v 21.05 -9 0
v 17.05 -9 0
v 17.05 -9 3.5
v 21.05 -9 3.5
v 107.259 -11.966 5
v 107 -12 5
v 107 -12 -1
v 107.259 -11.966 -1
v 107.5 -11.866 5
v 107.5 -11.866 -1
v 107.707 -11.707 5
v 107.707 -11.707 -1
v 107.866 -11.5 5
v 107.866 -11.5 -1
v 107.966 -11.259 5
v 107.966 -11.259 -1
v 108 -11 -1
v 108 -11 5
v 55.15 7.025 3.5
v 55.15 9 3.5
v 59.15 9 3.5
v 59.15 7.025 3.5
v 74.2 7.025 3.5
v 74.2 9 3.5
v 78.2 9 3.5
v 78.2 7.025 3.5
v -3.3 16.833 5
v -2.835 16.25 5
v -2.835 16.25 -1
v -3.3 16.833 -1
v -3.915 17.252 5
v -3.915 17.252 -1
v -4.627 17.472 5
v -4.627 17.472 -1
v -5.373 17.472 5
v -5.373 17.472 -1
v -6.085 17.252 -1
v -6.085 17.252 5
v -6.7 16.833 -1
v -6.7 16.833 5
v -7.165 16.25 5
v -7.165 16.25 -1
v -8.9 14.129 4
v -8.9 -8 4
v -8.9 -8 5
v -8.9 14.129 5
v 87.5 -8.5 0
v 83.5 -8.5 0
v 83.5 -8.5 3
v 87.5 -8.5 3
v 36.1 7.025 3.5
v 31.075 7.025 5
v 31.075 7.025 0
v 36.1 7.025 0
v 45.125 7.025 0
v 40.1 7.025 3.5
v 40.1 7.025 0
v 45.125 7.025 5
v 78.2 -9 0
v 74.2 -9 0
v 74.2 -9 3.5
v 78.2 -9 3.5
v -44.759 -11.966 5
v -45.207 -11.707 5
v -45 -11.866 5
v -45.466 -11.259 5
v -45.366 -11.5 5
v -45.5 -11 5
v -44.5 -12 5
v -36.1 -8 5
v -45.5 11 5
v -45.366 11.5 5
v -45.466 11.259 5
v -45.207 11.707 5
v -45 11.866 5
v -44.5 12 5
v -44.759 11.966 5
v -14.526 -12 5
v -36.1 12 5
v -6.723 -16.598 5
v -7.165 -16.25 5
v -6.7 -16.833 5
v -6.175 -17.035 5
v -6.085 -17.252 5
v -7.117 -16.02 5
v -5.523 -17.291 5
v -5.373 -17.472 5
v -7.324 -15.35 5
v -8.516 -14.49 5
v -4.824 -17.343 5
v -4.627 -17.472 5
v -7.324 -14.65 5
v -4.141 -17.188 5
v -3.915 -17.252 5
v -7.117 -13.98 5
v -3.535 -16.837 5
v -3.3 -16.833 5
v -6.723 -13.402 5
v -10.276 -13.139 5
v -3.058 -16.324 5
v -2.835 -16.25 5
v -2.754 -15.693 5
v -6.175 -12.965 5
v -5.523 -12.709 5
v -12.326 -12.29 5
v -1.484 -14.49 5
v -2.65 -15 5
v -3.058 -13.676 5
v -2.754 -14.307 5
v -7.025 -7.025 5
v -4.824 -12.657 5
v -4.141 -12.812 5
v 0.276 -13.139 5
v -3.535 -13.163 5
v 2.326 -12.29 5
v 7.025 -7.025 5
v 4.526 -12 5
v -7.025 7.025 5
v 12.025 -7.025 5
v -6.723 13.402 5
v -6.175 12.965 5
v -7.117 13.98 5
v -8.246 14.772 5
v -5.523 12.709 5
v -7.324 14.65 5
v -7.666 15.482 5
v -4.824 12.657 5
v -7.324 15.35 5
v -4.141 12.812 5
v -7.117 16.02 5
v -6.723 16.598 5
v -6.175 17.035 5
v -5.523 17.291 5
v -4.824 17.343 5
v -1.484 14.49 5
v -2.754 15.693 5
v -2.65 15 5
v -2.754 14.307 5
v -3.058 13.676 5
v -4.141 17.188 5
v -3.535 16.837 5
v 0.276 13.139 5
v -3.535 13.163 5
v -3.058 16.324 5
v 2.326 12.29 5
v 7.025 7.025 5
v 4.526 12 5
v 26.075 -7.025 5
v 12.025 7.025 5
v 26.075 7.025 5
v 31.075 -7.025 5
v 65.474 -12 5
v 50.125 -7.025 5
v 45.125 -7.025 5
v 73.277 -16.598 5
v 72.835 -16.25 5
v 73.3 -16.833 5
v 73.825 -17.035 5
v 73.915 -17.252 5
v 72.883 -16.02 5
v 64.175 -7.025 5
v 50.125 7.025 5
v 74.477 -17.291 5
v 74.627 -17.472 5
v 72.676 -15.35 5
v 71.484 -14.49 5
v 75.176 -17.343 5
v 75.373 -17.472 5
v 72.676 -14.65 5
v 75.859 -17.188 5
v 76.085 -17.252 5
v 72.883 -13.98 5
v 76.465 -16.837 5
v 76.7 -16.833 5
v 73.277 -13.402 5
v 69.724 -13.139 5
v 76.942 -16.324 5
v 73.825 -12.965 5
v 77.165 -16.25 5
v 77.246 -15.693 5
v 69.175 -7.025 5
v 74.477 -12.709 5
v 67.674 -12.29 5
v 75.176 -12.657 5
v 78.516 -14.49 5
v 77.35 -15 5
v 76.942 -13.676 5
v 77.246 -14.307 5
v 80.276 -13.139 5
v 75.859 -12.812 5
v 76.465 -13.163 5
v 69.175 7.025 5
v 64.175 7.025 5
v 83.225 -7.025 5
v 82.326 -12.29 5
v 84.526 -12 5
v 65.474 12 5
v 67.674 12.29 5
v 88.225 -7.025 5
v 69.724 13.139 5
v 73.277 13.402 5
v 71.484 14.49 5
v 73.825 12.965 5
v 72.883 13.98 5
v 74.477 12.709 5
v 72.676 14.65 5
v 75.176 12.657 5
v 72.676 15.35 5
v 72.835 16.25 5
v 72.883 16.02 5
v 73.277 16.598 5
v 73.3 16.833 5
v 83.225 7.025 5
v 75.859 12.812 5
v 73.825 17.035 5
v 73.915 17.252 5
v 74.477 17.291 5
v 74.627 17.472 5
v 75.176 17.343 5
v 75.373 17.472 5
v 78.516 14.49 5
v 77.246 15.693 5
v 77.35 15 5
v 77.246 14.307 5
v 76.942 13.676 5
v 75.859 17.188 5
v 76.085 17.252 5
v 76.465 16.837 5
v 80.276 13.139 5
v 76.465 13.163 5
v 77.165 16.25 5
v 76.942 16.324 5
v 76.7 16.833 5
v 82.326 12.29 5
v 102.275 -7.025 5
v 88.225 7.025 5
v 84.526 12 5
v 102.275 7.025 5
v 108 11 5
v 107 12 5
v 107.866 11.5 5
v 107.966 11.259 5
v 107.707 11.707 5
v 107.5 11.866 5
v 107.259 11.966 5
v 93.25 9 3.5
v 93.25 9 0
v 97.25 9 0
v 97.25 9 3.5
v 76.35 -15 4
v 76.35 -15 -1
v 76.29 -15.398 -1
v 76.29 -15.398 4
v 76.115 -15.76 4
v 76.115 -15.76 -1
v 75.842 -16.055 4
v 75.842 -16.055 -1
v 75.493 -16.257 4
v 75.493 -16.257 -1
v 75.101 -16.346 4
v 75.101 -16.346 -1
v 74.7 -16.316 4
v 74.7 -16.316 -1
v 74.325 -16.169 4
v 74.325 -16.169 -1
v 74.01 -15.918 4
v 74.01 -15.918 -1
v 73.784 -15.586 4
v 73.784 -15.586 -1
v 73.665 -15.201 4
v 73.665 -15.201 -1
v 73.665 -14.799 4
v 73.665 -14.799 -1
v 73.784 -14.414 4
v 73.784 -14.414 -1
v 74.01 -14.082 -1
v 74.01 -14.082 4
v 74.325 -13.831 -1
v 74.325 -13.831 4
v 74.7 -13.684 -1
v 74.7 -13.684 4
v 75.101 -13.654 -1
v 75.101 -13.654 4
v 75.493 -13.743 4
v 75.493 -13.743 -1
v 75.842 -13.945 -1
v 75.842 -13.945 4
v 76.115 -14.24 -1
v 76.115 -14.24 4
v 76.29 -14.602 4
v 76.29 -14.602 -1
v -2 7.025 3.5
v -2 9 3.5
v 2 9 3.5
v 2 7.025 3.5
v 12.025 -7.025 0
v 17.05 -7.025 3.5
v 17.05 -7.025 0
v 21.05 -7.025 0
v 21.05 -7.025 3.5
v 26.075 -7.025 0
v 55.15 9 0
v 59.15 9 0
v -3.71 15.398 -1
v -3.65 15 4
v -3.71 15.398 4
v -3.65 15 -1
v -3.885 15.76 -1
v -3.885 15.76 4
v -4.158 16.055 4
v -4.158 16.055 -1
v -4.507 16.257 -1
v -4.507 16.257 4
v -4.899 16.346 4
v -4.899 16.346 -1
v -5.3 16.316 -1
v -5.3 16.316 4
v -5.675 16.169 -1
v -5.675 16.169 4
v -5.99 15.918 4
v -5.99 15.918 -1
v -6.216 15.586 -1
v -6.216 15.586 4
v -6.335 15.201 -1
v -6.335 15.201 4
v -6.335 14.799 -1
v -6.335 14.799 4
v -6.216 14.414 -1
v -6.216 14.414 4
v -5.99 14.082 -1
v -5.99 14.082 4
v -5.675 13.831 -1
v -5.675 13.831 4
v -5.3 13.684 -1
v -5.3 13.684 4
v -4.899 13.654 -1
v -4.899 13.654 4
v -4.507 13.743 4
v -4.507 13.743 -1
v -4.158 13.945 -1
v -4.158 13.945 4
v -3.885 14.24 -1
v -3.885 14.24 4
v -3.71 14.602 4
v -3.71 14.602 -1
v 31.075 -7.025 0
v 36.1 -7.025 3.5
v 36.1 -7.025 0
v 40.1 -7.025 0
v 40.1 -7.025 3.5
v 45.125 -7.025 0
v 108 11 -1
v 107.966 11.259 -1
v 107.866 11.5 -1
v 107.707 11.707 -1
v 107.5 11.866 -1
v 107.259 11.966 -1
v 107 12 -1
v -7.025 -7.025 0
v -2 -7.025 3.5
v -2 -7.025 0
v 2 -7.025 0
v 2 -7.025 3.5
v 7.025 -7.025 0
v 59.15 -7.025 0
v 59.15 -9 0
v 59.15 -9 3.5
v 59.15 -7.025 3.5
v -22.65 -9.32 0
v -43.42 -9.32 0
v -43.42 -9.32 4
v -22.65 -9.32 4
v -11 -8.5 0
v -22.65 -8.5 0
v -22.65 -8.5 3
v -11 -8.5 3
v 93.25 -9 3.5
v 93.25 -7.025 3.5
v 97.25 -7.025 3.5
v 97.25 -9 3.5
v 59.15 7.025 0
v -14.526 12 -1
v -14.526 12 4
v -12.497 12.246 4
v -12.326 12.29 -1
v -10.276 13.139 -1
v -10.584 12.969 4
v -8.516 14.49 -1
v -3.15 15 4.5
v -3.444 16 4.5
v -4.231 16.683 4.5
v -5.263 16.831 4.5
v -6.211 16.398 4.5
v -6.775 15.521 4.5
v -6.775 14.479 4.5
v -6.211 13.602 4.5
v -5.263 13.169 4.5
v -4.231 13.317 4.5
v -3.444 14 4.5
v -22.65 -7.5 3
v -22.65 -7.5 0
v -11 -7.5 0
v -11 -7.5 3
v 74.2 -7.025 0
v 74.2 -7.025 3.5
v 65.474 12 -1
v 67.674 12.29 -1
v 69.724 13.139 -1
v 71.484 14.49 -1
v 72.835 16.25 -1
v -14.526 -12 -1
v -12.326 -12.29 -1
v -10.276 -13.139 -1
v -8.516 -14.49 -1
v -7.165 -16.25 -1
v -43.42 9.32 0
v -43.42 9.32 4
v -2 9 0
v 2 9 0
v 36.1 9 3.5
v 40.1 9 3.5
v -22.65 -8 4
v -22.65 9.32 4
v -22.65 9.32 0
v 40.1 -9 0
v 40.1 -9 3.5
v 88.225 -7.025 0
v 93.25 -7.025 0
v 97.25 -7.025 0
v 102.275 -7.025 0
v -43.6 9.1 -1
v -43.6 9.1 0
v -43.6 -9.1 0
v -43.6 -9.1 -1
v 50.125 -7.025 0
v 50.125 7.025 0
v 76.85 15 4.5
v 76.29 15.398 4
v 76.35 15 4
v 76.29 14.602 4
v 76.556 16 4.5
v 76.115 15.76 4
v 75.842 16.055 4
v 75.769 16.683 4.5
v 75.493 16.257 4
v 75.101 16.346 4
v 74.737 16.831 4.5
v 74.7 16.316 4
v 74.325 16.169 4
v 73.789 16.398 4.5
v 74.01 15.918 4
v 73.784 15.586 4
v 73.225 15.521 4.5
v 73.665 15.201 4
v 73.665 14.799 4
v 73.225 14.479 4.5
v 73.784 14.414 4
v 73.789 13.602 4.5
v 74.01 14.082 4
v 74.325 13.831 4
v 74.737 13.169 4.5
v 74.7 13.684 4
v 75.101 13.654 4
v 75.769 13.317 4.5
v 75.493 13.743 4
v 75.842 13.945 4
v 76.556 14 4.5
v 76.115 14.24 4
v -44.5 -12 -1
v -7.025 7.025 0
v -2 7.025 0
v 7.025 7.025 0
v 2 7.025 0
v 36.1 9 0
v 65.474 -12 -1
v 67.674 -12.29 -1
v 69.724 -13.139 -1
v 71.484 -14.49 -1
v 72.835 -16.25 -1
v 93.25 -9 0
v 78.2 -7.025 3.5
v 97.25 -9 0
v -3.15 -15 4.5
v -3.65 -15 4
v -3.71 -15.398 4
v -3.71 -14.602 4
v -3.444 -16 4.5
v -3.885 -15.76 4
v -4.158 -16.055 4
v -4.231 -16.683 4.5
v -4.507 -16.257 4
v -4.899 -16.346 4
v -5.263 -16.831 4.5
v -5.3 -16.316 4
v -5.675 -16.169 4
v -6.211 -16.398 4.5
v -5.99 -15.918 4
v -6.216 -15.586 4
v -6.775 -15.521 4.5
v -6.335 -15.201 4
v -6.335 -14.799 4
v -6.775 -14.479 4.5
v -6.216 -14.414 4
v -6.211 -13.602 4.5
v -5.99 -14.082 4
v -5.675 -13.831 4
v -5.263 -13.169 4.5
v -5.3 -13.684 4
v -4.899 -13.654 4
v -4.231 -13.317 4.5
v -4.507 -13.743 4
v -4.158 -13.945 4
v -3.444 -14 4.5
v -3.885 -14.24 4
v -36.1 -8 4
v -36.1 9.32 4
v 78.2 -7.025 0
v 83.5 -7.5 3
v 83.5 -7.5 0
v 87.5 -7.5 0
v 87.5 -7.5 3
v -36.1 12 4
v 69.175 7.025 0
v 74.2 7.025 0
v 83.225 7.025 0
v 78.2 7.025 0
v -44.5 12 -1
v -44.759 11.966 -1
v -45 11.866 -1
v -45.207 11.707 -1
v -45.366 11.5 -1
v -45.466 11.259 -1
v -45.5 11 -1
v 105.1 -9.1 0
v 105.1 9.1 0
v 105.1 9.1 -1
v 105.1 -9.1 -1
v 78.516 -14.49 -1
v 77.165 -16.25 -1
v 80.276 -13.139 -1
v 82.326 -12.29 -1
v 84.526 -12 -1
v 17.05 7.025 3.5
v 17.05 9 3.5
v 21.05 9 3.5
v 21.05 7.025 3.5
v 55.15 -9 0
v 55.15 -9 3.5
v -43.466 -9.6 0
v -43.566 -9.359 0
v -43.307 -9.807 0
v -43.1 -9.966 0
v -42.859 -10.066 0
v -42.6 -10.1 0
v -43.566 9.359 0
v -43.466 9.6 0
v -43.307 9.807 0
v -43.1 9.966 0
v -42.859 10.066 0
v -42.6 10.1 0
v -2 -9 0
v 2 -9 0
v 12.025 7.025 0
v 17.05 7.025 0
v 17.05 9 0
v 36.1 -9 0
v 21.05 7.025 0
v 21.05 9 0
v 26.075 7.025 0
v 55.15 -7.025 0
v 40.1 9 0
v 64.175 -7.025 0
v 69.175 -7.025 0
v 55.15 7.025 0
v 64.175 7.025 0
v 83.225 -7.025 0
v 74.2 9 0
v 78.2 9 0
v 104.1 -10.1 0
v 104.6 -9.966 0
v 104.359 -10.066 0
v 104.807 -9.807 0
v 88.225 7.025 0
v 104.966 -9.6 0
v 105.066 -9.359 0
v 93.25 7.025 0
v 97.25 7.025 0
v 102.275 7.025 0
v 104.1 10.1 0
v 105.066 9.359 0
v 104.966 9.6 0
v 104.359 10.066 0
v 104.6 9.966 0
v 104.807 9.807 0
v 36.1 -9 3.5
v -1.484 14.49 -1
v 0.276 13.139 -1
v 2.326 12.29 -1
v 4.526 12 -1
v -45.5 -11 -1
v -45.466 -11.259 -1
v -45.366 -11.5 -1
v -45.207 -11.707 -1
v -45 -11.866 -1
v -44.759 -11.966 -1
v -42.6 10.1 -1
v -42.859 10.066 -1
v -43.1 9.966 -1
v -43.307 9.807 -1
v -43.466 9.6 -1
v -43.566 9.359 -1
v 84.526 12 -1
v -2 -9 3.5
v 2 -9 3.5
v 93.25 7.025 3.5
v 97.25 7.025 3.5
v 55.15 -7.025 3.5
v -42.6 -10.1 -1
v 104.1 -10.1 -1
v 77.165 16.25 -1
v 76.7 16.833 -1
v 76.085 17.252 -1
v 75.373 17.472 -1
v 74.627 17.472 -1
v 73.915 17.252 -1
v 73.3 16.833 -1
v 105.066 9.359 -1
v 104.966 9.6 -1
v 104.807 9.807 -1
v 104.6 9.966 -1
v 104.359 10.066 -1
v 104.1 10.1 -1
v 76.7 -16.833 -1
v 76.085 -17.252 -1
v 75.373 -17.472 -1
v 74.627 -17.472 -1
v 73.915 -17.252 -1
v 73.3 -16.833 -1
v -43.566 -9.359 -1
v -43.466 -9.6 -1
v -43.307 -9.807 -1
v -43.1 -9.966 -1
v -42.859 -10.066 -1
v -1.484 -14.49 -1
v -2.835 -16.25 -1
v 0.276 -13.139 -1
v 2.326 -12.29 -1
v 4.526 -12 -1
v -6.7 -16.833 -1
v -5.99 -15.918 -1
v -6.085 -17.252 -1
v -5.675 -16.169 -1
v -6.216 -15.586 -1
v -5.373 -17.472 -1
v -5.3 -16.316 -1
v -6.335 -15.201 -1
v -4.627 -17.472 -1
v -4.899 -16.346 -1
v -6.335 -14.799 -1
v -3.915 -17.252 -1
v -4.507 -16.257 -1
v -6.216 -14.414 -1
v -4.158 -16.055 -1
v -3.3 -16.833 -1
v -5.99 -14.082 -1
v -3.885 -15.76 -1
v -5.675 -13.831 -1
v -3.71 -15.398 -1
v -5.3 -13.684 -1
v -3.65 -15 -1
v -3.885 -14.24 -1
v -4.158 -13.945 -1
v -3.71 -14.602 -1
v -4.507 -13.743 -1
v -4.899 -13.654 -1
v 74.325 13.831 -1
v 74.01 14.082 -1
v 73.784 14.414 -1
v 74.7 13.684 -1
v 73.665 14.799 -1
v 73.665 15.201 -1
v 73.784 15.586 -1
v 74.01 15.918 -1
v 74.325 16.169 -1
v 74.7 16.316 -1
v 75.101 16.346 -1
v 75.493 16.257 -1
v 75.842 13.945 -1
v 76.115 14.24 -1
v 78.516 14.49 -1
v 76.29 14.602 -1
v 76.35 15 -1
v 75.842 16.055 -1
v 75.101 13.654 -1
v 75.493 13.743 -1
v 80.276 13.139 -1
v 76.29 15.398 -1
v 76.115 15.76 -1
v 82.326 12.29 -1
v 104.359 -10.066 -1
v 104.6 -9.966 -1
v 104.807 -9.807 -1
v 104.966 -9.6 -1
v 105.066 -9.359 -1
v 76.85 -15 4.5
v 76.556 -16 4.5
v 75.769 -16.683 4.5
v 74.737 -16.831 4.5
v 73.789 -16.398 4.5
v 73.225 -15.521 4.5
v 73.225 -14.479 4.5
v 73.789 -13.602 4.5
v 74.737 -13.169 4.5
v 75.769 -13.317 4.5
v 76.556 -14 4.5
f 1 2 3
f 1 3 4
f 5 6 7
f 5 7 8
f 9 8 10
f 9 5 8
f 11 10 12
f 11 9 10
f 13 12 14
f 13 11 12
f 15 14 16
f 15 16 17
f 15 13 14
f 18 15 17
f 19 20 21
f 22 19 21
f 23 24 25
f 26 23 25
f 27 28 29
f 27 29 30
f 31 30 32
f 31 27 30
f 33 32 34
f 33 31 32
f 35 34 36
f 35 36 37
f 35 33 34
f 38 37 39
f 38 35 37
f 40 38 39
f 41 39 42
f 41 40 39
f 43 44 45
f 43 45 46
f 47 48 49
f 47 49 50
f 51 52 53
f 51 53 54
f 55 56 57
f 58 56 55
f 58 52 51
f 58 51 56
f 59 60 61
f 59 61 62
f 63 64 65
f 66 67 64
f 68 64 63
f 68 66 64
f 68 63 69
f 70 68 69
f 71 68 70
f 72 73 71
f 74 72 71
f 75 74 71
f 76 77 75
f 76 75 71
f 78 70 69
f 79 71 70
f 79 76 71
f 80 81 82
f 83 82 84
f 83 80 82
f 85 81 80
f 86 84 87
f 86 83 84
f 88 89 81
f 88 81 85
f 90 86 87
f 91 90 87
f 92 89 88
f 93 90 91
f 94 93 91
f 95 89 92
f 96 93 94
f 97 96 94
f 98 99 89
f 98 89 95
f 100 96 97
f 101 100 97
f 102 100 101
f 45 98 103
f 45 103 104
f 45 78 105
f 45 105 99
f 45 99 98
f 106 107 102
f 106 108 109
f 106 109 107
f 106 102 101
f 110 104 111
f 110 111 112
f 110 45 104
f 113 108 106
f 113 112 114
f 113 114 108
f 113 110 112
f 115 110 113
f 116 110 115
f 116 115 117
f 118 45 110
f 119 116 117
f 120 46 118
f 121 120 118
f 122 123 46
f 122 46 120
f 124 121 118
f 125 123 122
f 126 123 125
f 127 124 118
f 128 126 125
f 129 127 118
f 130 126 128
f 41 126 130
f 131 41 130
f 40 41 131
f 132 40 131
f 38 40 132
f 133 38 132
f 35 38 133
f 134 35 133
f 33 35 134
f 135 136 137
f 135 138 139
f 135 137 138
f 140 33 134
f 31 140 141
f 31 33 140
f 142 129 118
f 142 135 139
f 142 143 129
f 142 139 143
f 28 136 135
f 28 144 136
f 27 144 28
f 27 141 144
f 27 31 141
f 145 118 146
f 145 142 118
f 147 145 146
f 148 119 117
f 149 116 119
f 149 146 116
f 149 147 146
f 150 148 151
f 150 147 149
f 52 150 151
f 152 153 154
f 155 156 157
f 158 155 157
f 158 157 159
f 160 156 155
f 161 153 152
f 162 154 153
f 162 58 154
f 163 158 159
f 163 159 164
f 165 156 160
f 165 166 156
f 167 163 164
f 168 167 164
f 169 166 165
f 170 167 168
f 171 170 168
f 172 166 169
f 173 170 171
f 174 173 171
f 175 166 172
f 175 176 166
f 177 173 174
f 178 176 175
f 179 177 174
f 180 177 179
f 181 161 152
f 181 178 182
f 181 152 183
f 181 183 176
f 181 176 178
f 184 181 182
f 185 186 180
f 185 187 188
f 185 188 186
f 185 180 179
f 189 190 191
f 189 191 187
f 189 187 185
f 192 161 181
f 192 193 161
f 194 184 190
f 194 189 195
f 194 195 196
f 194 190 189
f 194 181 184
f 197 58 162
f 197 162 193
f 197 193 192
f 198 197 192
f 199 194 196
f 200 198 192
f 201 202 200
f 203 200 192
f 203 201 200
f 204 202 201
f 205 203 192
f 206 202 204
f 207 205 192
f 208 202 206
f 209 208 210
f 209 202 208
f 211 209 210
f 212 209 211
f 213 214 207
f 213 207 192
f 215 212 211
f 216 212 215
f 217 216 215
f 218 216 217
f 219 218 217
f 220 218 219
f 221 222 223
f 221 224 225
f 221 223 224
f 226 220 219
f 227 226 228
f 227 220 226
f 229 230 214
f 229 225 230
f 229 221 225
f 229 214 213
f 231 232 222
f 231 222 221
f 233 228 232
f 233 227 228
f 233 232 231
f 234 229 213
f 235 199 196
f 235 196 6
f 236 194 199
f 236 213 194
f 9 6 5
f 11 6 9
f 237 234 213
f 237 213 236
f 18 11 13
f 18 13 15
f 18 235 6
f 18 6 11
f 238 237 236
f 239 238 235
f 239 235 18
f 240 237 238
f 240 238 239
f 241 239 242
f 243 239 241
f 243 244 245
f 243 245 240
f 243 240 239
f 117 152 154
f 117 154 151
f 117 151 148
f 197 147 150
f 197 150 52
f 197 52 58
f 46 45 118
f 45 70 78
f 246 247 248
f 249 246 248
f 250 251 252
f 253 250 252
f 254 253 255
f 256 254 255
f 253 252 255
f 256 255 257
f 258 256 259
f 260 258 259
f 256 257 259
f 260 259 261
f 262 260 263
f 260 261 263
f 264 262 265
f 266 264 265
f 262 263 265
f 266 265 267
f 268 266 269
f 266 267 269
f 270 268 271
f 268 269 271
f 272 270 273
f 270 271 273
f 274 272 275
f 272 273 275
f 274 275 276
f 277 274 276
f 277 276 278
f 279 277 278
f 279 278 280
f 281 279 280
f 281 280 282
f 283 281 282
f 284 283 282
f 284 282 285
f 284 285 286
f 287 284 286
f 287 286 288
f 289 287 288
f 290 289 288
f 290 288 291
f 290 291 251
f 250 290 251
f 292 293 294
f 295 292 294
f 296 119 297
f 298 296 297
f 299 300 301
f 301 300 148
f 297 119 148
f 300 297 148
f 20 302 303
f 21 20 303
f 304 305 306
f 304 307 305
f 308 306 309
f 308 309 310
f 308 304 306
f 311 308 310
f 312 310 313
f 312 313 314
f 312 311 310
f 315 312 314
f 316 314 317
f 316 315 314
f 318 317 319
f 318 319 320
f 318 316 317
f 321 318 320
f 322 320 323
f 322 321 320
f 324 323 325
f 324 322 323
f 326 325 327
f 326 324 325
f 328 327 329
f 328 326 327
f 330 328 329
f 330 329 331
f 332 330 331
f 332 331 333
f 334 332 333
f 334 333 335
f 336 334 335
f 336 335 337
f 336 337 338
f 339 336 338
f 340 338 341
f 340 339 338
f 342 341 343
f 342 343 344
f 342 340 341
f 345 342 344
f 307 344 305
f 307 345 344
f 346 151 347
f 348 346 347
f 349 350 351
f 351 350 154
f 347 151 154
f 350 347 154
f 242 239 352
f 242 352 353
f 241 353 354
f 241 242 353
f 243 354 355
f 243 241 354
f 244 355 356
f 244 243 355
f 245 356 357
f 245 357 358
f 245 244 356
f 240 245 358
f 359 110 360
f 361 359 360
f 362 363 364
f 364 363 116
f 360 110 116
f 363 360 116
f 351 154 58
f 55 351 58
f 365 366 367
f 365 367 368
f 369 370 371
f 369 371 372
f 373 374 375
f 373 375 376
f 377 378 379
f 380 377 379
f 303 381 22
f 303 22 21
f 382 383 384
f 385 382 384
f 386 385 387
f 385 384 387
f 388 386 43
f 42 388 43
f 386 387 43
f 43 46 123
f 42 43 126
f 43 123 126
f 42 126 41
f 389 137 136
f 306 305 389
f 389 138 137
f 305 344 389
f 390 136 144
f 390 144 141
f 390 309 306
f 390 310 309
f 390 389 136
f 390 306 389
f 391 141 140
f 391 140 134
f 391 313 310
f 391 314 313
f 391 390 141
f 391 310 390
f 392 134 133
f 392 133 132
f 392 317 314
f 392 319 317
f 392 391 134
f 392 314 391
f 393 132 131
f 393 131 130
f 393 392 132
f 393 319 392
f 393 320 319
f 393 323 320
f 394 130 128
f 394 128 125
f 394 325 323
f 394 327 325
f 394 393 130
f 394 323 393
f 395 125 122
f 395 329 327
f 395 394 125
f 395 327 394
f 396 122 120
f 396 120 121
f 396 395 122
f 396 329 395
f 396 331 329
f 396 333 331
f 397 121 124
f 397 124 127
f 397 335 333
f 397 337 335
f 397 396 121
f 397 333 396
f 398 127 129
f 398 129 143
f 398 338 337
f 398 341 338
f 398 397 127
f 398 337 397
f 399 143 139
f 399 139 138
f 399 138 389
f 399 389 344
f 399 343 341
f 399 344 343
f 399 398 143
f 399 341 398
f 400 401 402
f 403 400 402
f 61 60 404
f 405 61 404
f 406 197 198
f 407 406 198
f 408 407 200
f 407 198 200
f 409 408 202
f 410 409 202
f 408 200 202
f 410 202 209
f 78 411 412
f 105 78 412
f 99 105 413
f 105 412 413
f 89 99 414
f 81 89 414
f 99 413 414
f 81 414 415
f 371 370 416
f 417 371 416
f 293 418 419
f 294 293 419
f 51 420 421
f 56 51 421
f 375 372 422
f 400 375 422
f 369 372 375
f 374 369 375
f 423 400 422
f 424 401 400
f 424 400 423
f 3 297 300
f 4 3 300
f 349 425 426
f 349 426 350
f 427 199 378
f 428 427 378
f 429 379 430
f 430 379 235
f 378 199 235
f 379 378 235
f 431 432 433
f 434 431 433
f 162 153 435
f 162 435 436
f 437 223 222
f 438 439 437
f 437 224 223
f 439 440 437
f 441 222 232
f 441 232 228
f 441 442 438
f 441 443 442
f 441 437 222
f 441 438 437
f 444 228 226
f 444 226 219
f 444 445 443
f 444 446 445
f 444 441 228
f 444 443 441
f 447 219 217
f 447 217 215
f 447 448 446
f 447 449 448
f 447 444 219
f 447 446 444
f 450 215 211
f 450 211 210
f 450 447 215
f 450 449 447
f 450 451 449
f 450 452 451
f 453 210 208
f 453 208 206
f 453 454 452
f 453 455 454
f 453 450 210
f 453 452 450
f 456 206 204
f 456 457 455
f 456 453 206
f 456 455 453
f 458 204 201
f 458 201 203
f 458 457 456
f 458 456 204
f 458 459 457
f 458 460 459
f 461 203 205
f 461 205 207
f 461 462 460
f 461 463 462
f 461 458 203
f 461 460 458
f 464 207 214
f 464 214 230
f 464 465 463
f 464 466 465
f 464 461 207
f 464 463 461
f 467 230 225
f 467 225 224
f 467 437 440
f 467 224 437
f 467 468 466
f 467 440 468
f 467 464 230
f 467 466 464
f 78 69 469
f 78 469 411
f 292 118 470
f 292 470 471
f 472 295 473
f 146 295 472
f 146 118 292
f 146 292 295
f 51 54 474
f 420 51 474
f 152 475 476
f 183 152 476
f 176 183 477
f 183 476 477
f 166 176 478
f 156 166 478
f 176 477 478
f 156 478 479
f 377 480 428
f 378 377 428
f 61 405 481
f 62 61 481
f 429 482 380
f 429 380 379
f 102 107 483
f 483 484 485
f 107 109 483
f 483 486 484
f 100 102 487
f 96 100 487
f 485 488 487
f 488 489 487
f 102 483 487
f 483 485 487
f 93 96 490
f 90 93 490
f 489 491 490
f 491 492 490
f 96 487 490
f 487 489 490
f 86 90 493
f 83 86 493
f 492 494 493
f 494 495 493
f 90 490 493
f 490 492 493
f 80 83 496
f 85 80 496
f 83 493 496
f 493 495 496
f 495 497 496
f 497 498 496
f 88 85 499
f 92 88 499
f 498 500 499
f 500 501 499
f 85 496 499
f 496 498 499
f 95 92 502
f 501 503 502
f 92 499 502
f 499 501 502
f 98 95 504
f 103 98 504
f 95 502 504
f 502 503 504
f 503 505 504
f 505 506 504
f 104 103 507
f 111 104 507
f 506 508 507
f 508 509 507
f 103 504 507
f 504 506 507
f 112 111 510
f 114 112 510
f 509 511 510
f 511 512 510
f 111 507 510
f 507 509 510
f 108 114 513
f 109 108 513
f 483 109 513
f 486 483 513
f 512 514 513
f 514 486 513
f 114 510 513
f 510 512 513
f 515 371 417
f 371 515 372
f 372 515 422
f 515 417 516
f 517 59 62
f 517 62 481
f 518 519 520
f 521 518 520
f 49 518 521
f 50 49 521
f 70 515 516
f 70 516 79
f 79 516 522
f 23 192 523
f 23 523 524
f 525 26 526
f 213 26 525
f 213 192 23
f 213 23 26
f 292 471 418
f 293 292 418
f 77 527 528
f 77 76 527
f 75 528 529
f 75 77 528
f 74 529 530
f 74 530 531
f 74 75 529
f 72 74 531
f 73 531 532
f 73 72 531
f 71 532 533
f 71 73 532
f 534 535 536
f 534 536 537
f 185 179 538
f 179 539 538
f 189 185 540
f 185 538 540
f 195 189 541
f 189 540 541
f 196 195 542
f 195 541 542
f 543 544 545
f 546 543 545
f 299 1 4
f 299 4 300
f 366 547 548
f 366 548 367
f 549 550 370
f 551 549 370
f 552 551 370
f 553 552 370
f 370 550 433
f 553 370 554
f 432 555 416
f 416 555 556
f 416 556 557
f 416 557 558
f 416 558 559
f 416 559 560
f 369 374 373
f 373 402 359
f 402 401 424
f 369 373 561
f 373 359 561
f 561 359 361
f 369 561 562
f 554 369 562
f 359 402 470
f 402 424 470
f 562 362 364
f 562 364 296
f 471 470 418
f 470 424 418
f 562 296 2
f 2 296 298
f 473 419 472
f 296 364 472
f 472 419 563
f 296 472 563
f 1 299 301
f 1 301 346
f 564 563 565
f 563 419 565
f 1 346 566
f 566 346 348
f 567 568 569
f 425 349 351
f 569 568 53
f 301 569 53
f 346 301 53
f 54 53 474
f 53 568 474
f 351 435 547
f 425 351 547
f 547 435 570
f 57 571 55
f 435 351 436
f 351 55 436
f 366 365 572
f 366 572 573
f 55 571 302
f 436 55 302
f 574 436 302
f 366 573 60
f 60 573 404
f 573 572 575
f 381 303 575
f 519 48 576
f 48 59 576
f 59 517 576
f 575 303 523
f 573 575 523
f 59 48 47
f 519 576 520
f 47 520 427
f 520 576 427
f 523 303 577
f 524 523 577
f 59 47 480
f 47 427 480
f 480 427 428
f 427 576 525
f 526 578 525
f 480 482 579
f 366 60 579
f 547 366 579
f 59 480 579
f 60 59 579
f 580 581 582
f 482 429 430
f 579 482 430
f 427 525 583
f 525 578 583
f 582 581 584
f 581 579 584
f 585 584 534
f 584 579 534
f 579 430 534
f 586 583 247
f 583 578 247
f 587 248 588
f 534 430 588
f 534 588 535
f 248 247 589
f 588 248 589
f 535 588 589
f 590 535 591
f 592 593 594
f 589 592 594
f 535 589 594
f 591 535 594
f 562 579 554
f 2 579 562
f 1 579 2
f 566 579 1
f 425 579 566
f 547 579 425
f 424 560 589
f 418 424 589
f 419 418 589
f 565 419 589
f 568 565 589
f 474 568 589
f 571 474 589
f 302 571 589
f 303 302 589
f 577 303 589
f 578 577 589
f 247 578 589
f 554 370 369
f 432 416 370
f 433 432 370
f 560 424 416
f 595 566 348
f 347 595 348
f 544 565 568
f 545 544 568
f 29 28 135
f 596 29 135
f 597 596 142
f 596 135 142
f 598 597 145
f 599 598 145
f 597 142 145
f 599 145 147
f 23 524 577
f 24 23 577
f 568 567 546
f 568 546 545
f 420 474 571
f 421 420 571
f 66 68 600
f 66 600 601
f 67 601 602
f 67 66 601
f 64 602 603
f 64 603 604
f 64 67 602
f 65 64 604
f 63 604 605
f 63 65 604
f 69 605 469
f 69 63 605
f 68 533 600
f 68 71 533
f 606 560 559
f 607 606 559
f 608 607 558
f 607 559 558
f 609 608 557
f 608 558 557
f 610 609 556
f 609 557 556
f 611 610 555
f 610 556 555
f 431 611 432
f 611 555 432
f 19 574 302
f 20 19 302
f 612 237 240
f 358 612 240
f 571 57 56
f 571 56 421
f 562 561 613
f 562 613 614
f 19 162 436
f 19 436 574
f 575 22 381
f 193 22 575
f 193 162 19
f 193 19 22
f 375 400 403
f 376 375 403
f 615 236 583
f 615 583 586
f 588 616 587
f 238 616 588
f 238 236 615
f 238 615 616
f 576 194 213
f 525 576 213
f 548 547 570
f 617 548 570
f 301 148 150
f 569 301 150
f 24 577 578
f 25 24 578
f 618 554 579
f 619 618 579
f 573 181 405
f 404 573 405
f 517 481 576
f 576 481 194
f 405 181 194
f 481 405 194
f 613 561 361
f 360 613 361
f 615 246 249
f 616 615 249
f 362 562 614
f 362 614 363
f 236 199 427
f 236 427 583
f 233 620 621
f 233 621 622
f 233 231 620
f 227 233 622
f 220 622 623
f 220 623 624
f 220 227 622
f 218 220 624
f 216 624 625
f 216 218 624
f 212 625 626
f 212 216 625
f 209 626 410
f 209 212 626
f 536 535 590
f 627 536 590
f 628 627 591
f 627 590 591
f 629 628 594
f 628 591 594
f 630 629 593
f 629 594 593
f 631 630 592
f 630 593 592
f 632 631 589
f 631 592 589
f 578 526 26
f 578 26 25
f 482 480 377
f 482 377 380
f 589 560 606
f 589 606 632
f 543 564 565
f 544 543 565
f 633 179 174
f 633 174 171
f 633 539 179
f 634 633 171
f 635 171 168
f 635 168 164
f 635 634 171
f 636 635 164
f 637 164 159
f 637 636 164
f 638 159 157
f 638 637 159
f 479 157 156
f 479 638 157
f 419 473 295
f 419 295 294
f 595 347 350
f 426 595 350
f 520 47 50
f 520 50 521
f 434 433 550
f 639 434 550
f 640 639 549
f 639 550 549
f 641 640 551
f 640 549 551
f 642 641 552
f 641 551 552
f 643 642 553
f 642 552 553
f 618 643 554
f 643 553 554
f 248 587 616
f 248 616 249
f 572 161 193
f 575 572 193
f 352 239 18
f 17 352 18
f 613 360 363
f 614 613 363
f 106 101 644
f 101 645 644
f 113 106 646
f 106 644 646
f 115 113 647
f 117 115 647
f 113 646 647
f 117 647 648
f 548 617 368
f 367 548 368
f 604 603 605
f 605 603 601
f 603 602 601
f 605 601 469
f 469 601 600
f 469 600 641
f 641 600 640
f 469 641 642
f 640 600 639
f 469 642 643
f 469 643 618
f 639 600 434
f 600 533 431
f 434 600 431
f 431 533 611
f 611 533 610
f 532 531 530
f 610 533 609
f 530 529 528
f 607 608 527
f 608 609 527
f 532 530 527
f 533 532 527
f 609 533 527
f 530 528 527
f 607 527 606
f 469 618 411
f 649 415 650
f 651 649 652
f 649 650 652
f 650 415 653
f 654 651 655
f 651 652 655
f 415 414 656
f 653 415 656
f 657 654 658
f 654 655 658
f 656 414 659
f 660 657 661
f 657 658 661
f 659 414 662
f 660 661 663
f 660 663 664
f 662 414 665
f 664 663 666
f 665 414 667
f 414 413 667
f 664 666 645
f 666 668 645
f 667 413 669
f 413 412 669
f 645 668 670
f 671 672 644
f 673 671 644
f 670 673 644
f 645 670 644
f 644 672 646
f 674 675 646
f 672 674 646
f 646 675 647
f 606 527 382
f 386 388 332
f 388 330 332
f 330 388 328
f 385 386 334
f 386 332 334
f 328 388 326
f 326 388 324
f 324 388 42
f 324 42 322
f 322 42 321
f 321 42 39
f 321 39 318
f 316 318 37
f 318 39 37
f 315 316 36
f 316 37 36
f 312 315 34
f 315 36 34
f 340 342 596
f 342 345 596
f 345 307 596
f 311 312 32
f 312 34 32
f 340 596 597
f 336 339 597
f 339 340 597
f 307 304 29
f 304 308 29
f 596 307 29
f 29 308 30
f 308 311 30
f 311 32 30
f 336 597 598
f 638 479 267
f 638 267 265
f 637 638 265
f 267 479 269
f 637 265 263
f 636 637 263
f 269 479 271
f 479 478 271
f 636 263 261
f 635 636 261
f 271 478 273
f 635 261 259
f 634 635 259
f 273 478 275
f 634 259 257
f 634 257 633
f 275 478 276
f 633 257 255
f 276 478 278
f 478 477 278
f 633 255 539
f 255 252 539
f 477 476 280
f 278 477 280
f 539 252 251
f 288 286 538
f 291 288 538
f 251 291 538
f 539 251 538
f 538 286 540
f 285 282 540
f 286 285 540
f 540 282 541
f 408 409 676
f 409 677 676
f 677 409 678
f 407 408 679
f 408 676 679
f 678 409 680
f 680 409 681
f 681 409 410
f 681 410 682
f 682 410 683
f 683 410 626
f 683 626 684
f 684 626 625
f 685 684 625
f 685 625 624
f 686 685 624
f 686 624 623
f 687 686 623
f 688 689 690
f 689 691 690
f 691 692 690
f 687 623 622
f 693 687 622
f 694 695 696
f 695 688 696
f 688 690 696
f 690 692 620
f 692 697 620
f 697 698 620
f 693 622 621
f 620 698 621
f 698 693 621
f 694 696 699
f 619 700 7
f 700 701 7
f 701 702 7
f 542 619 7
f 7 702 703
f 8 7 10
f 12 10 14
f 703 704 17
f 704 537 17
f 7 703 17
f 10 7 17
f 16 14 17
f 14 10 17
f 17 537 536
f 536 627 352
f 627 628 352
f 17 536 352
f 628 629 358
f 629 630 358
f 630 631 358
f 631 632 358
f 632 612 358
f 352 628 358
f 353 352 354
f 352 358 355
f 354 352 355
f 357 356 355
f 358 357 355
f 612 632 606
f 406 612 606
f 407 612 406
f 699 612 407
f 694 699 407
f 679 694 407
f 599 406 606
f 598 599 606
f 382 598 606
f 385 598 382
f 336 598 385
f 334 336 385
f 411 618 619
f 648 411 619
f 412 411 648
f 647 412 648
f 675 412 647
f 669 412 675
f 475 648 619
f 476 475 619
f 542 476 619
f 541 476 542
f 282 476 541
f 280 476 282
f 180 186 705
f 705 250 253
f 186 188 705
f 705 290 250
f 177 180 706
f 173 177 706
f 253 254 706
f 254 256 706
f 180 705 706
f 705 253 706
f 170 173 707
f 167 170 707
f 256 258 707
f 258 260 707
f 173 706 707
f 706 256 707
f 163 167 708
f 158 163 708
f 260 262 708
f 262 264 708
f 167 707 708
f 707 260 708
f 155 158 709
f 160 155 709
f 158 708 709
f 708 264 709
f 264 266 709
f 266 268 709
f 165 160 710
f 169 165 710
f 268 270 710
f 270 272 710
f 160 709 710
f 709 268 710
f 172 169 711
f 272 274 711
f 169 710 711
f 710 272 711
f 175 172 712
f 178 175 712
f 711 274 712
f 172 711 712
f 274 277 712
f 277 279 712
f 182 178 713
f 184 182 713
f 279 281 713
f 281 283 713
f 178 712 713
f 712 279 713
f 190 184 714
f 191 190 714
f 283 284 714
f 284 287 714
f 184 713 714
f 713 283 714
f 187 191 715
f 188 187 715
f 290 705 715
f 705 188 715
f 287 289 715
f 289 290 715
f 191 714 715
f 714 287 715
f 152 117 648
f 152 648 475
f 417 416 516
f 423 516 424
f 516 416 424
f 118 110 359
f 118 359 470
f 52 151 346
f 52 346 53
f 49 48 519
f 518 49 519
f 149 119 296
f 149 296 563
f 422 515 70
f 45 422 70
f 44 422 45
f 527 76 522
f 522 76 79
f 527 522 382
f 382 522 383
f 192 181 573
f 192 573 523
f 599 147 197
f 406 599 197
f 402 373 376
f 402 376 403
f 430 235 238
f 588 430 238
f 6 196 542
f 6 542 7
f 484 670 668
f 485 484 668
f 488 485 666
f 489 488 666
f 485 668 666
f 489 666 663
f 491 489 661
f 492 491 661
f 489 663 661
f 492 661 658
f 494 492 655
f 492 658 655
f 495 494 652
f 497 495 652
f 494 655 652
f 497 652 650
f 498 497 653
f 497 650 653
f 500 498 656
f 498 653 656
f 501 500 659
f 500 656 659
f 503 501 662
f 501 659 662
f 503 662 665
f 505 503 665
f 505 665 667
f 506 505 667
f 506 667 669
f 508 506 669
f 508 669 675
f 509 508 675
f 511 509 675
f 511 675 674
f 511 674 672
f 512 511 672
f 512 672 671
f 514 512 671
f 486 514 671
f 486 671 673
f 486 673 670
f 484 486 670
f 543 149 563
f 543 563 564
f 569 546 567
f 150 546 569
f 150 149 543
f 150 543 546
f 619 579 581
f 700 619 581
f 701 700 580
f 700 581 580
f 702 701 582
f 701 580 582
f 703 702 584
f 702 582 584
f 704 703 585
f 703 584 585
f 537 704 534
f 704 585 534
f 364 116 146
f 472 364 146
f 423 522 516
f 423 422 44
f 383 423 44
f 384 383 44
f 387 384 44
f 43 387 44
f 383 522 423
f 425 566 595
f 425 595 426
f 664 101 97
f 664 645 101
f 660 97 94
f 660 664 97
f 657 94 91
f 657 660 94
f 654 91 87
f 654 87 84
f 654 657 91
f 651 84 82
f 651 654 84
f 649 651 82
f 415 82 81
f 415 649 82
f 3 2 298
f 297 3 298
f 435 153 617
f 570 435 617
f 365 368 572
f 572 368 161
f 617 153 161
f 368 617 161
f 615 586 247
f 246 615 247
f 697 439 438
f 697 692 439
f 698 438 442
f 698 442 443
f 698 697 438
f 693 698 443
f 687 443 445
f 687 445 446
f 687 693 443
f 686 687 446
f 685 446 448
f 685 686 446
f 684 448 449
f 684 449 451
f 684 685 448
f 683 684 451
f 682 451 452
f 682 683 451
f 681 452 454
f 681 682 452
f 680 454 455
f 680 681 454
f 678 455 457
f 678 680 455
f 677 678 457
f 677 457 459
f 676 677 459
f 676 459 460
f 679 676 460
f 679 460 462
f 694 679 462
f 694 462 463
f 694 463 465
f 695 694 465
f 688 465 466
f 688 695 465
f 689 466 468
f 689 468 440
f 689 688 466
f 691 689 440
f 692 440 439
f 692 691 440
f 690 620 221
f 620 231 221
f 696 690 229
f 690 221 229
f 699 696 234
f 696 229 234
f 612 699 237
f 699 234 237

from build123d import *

# Parameters (mm, degrees)
PAD_DEPTH           = 5
PAD_DEPTH_BACK      = 1
SKETCH001_W         = 14.05
SKETCH001_H         = 14.05
POCKET_DEPTH        = 1.001
POCKET_DEPTH_BACK   = 5.001
SKETCH004_W         = 4
SKETCH004_H         = 18
POCKET002_DEPTH     = 3.5
LINEARPATTERN_COUNT = 6
LINEARPATTERN_PITCH = 19.05
POCKET001_DEPTH     = 1.001
SKETCH005_R         = 1.35
PAD001_DEPTH        = 5
PAD001_DEPTH_BACK   = 1
CHAMFER_SIZE        = 1
SKETCH006_W         = 20.77
SKETCH006_H         = 18.64
POCKET003_DEPTH     = 4
SKETCH007_W         = 12
SKETCH007_H         = 1
SKETCH007_W_2       = 4
POCKET004_DEPTH     = 3
SKETCH008_W         = 27.2
SKETCH008_H         = 28
POCKET005_DEPTH     = 1.001


with BuildPart() as part:
    # Sketch → Pad (new body, two sides)
    with BuildSketch(Plane.XY) as pad_sk:
        with BuildLine():
            Line((-45.5, 11), (-45.5, -11))
            ThreePointArc((-45.5, -11), (-45.207107, -11.707107), (-44.5, -12))
            Line((-44.5, -12), (107, -12))
            ThreePointArc((107, -12), (107.707107, -11.707107), (108, -11))
            Line((108, 11), (108, -11))
            ThreePointArc((108, 11), (107.707107, 11.707107), (107, 12))
            Line((-44.5, 12), (107, 12))
            ThreePointArc((-44.5, 12), (-45.207107, 11.707107), (-45.5, 11))
        make_face()
    extrude(amount=PAD_DEPTH)
    extrude(pad_sk.sketch, amount=-PAD_DEPTH_BACK)

    # Sketch001 → Pocket (cut, two sides)
    with BuildSketch(Plane.XY) as pocket_sk:
        Rectangle(SKETCH001_W, SKETCH001_H)
    pocket = extrude(amount=-POCKET_DEPTH, mode=Mode.SUBTRACT) + extrude(pocket_sk.sketch, amount=POCKET_DEPTH_BACK, mode=Mode.SUBTRACT)

    # Sketch004 → Pocket002 (cut)
    with BuildSketch(Plane.XY):
        Rectangle(SKETCH004_W, SKETCH004_H)
    pocket002 = extrude(amount=POCKET002_DEPTH, mode=Mode.SUBTRACT)

    # LinearPattern: Pocket, Pocket002 ×6
    with Locations(*[(i * LINEARPATTERN_PITCH, 0, 0) for i in range(1, LINEARPATTERN_COUNT)]):
        add(pocket, mode=Mode.SUBTRACT)
        add(pocket002, mode=Mode.SUBTRACT)

    # Sketch002 → Pocket001 (cut, through all)
    with BuildSketch(Plane.XY):
        with BuildLine():
            Line((-43.6, 9.1), (-43.6, -9.1))
            ThreePointArc((-43.6, -9.1), (-43.307107, -9.807107), (-42.6, -10.1))
            Line((-42.6, -10.1), (104.1, -10.1))
            ThreePointArc((104.1, -10.1), (104.807107, -9.807107), (105.1, -9.1))
            Line((105.1, 9.1), (105.1, -9.1))
            ThreePointArc((105.1, 9.1), (104.807107, 9.807107), (104.1, 10.1))
            Line((-42.6, 10.1), (104.1, 10.1))
            ThreePointArc((-42.6, 10.1), (-43.307107, 9.807107), (-43.6, 9.1))
        make_face()
    extrude(amount=-POCKET001_DEPTH, mode=Mode.SUBTRACT)

    # Sketch005 → Pad001 (join, two sides)
    with BuildSketch(Plane.XY) as pad001_sk:
        with BuildLine():
            Line((65.473721, 12), (84.526279, 12))
            ThreePointArc((77.165064, 16.25), (80.276279, 13.138784), (84.526279, 12))
            ThreePointArc((77.165064, 16.25), (75, 17.5), (72.834936, 16.25))
            ThreePointArc((65.473721, 12), (69.723721, 13.138784), (72.834936, 16.25))
        make_face()
        with Locations((75, 15)):
            Circle(SKETCH005_R, mode=Mode.SUBTRACT)
        with BuildLine():
            Line((-14.526279, 12), (4.526279, 12))
            ThreePointArc((-2.834936, 16.25), (0.276279, 13.138784), (4.526279, 12))
            ThreePointArc((-2.834936, 16.25), (-5, 17.5), (-7.165064, 16.25))
            ThreePointArc((-14.526279, 12), (-10.276279, 13.138784), (-7.165064, 16.25))
        make_face()
        with Locations((-5, 15)):
            Circle(SKETCH005_R, mode=Mode.SUBTRACT)
    pad001 = extrude(amount=PAD001_DEPTH) + extrude(pad001_sk.sketch, amount=-PAD001_DEPTH_BACK)

    # Mirrored: Pad001 across XZ
    add(pad001.mirror(Plane.XZ))

    # Chamfer
    chamfer_edges = [part.edges().sort_by_distance(p)[0] for p in [
        (73.65, 15, 5),
        (-6.35, 15, 5),
        (-6.35, -15, 5),
        (73.65, -15, 5),
    ]]
    chamfer(chamfer_edges, length=CHAMFER_SIZE)

    # Sketch006 → Pocket003 (cut)
    with BuildSketch(Plane.XY):
        with Locations((-33.035, 0)):
            Rectangle(SKETCH006_W, SKETCH006_H)
    extrude(amount=POCKET003_DEPTH, mode=Mode.SUBTRACT)

    # Sketch007 → Pocket004 (cut)
    with BuildSketch(Plane.XY):
        with Locations((-17, -8)):
            Rectangle(SKETCH007_W, SKETCH007_H)
        with Locations((85.5, -8)):
            Rectangle(SKETCH007_W_2, SKETCH007_H)
    extrude(amount=POCKET004_DEPTH, mode=Mode.SUBTRACT)

    # Sketch008 → Pocket005 (cut, through all)
    with BuildSketch(Plane.XY.offset(4)):
        with Locations((-22.5, 6)):
            Rectangle(SKETCH008_W, SKETCH008_H)
    extrude(amount=POCKET005_DEPTH, mode=Mode.SUBTRACT)


solid = part.part
